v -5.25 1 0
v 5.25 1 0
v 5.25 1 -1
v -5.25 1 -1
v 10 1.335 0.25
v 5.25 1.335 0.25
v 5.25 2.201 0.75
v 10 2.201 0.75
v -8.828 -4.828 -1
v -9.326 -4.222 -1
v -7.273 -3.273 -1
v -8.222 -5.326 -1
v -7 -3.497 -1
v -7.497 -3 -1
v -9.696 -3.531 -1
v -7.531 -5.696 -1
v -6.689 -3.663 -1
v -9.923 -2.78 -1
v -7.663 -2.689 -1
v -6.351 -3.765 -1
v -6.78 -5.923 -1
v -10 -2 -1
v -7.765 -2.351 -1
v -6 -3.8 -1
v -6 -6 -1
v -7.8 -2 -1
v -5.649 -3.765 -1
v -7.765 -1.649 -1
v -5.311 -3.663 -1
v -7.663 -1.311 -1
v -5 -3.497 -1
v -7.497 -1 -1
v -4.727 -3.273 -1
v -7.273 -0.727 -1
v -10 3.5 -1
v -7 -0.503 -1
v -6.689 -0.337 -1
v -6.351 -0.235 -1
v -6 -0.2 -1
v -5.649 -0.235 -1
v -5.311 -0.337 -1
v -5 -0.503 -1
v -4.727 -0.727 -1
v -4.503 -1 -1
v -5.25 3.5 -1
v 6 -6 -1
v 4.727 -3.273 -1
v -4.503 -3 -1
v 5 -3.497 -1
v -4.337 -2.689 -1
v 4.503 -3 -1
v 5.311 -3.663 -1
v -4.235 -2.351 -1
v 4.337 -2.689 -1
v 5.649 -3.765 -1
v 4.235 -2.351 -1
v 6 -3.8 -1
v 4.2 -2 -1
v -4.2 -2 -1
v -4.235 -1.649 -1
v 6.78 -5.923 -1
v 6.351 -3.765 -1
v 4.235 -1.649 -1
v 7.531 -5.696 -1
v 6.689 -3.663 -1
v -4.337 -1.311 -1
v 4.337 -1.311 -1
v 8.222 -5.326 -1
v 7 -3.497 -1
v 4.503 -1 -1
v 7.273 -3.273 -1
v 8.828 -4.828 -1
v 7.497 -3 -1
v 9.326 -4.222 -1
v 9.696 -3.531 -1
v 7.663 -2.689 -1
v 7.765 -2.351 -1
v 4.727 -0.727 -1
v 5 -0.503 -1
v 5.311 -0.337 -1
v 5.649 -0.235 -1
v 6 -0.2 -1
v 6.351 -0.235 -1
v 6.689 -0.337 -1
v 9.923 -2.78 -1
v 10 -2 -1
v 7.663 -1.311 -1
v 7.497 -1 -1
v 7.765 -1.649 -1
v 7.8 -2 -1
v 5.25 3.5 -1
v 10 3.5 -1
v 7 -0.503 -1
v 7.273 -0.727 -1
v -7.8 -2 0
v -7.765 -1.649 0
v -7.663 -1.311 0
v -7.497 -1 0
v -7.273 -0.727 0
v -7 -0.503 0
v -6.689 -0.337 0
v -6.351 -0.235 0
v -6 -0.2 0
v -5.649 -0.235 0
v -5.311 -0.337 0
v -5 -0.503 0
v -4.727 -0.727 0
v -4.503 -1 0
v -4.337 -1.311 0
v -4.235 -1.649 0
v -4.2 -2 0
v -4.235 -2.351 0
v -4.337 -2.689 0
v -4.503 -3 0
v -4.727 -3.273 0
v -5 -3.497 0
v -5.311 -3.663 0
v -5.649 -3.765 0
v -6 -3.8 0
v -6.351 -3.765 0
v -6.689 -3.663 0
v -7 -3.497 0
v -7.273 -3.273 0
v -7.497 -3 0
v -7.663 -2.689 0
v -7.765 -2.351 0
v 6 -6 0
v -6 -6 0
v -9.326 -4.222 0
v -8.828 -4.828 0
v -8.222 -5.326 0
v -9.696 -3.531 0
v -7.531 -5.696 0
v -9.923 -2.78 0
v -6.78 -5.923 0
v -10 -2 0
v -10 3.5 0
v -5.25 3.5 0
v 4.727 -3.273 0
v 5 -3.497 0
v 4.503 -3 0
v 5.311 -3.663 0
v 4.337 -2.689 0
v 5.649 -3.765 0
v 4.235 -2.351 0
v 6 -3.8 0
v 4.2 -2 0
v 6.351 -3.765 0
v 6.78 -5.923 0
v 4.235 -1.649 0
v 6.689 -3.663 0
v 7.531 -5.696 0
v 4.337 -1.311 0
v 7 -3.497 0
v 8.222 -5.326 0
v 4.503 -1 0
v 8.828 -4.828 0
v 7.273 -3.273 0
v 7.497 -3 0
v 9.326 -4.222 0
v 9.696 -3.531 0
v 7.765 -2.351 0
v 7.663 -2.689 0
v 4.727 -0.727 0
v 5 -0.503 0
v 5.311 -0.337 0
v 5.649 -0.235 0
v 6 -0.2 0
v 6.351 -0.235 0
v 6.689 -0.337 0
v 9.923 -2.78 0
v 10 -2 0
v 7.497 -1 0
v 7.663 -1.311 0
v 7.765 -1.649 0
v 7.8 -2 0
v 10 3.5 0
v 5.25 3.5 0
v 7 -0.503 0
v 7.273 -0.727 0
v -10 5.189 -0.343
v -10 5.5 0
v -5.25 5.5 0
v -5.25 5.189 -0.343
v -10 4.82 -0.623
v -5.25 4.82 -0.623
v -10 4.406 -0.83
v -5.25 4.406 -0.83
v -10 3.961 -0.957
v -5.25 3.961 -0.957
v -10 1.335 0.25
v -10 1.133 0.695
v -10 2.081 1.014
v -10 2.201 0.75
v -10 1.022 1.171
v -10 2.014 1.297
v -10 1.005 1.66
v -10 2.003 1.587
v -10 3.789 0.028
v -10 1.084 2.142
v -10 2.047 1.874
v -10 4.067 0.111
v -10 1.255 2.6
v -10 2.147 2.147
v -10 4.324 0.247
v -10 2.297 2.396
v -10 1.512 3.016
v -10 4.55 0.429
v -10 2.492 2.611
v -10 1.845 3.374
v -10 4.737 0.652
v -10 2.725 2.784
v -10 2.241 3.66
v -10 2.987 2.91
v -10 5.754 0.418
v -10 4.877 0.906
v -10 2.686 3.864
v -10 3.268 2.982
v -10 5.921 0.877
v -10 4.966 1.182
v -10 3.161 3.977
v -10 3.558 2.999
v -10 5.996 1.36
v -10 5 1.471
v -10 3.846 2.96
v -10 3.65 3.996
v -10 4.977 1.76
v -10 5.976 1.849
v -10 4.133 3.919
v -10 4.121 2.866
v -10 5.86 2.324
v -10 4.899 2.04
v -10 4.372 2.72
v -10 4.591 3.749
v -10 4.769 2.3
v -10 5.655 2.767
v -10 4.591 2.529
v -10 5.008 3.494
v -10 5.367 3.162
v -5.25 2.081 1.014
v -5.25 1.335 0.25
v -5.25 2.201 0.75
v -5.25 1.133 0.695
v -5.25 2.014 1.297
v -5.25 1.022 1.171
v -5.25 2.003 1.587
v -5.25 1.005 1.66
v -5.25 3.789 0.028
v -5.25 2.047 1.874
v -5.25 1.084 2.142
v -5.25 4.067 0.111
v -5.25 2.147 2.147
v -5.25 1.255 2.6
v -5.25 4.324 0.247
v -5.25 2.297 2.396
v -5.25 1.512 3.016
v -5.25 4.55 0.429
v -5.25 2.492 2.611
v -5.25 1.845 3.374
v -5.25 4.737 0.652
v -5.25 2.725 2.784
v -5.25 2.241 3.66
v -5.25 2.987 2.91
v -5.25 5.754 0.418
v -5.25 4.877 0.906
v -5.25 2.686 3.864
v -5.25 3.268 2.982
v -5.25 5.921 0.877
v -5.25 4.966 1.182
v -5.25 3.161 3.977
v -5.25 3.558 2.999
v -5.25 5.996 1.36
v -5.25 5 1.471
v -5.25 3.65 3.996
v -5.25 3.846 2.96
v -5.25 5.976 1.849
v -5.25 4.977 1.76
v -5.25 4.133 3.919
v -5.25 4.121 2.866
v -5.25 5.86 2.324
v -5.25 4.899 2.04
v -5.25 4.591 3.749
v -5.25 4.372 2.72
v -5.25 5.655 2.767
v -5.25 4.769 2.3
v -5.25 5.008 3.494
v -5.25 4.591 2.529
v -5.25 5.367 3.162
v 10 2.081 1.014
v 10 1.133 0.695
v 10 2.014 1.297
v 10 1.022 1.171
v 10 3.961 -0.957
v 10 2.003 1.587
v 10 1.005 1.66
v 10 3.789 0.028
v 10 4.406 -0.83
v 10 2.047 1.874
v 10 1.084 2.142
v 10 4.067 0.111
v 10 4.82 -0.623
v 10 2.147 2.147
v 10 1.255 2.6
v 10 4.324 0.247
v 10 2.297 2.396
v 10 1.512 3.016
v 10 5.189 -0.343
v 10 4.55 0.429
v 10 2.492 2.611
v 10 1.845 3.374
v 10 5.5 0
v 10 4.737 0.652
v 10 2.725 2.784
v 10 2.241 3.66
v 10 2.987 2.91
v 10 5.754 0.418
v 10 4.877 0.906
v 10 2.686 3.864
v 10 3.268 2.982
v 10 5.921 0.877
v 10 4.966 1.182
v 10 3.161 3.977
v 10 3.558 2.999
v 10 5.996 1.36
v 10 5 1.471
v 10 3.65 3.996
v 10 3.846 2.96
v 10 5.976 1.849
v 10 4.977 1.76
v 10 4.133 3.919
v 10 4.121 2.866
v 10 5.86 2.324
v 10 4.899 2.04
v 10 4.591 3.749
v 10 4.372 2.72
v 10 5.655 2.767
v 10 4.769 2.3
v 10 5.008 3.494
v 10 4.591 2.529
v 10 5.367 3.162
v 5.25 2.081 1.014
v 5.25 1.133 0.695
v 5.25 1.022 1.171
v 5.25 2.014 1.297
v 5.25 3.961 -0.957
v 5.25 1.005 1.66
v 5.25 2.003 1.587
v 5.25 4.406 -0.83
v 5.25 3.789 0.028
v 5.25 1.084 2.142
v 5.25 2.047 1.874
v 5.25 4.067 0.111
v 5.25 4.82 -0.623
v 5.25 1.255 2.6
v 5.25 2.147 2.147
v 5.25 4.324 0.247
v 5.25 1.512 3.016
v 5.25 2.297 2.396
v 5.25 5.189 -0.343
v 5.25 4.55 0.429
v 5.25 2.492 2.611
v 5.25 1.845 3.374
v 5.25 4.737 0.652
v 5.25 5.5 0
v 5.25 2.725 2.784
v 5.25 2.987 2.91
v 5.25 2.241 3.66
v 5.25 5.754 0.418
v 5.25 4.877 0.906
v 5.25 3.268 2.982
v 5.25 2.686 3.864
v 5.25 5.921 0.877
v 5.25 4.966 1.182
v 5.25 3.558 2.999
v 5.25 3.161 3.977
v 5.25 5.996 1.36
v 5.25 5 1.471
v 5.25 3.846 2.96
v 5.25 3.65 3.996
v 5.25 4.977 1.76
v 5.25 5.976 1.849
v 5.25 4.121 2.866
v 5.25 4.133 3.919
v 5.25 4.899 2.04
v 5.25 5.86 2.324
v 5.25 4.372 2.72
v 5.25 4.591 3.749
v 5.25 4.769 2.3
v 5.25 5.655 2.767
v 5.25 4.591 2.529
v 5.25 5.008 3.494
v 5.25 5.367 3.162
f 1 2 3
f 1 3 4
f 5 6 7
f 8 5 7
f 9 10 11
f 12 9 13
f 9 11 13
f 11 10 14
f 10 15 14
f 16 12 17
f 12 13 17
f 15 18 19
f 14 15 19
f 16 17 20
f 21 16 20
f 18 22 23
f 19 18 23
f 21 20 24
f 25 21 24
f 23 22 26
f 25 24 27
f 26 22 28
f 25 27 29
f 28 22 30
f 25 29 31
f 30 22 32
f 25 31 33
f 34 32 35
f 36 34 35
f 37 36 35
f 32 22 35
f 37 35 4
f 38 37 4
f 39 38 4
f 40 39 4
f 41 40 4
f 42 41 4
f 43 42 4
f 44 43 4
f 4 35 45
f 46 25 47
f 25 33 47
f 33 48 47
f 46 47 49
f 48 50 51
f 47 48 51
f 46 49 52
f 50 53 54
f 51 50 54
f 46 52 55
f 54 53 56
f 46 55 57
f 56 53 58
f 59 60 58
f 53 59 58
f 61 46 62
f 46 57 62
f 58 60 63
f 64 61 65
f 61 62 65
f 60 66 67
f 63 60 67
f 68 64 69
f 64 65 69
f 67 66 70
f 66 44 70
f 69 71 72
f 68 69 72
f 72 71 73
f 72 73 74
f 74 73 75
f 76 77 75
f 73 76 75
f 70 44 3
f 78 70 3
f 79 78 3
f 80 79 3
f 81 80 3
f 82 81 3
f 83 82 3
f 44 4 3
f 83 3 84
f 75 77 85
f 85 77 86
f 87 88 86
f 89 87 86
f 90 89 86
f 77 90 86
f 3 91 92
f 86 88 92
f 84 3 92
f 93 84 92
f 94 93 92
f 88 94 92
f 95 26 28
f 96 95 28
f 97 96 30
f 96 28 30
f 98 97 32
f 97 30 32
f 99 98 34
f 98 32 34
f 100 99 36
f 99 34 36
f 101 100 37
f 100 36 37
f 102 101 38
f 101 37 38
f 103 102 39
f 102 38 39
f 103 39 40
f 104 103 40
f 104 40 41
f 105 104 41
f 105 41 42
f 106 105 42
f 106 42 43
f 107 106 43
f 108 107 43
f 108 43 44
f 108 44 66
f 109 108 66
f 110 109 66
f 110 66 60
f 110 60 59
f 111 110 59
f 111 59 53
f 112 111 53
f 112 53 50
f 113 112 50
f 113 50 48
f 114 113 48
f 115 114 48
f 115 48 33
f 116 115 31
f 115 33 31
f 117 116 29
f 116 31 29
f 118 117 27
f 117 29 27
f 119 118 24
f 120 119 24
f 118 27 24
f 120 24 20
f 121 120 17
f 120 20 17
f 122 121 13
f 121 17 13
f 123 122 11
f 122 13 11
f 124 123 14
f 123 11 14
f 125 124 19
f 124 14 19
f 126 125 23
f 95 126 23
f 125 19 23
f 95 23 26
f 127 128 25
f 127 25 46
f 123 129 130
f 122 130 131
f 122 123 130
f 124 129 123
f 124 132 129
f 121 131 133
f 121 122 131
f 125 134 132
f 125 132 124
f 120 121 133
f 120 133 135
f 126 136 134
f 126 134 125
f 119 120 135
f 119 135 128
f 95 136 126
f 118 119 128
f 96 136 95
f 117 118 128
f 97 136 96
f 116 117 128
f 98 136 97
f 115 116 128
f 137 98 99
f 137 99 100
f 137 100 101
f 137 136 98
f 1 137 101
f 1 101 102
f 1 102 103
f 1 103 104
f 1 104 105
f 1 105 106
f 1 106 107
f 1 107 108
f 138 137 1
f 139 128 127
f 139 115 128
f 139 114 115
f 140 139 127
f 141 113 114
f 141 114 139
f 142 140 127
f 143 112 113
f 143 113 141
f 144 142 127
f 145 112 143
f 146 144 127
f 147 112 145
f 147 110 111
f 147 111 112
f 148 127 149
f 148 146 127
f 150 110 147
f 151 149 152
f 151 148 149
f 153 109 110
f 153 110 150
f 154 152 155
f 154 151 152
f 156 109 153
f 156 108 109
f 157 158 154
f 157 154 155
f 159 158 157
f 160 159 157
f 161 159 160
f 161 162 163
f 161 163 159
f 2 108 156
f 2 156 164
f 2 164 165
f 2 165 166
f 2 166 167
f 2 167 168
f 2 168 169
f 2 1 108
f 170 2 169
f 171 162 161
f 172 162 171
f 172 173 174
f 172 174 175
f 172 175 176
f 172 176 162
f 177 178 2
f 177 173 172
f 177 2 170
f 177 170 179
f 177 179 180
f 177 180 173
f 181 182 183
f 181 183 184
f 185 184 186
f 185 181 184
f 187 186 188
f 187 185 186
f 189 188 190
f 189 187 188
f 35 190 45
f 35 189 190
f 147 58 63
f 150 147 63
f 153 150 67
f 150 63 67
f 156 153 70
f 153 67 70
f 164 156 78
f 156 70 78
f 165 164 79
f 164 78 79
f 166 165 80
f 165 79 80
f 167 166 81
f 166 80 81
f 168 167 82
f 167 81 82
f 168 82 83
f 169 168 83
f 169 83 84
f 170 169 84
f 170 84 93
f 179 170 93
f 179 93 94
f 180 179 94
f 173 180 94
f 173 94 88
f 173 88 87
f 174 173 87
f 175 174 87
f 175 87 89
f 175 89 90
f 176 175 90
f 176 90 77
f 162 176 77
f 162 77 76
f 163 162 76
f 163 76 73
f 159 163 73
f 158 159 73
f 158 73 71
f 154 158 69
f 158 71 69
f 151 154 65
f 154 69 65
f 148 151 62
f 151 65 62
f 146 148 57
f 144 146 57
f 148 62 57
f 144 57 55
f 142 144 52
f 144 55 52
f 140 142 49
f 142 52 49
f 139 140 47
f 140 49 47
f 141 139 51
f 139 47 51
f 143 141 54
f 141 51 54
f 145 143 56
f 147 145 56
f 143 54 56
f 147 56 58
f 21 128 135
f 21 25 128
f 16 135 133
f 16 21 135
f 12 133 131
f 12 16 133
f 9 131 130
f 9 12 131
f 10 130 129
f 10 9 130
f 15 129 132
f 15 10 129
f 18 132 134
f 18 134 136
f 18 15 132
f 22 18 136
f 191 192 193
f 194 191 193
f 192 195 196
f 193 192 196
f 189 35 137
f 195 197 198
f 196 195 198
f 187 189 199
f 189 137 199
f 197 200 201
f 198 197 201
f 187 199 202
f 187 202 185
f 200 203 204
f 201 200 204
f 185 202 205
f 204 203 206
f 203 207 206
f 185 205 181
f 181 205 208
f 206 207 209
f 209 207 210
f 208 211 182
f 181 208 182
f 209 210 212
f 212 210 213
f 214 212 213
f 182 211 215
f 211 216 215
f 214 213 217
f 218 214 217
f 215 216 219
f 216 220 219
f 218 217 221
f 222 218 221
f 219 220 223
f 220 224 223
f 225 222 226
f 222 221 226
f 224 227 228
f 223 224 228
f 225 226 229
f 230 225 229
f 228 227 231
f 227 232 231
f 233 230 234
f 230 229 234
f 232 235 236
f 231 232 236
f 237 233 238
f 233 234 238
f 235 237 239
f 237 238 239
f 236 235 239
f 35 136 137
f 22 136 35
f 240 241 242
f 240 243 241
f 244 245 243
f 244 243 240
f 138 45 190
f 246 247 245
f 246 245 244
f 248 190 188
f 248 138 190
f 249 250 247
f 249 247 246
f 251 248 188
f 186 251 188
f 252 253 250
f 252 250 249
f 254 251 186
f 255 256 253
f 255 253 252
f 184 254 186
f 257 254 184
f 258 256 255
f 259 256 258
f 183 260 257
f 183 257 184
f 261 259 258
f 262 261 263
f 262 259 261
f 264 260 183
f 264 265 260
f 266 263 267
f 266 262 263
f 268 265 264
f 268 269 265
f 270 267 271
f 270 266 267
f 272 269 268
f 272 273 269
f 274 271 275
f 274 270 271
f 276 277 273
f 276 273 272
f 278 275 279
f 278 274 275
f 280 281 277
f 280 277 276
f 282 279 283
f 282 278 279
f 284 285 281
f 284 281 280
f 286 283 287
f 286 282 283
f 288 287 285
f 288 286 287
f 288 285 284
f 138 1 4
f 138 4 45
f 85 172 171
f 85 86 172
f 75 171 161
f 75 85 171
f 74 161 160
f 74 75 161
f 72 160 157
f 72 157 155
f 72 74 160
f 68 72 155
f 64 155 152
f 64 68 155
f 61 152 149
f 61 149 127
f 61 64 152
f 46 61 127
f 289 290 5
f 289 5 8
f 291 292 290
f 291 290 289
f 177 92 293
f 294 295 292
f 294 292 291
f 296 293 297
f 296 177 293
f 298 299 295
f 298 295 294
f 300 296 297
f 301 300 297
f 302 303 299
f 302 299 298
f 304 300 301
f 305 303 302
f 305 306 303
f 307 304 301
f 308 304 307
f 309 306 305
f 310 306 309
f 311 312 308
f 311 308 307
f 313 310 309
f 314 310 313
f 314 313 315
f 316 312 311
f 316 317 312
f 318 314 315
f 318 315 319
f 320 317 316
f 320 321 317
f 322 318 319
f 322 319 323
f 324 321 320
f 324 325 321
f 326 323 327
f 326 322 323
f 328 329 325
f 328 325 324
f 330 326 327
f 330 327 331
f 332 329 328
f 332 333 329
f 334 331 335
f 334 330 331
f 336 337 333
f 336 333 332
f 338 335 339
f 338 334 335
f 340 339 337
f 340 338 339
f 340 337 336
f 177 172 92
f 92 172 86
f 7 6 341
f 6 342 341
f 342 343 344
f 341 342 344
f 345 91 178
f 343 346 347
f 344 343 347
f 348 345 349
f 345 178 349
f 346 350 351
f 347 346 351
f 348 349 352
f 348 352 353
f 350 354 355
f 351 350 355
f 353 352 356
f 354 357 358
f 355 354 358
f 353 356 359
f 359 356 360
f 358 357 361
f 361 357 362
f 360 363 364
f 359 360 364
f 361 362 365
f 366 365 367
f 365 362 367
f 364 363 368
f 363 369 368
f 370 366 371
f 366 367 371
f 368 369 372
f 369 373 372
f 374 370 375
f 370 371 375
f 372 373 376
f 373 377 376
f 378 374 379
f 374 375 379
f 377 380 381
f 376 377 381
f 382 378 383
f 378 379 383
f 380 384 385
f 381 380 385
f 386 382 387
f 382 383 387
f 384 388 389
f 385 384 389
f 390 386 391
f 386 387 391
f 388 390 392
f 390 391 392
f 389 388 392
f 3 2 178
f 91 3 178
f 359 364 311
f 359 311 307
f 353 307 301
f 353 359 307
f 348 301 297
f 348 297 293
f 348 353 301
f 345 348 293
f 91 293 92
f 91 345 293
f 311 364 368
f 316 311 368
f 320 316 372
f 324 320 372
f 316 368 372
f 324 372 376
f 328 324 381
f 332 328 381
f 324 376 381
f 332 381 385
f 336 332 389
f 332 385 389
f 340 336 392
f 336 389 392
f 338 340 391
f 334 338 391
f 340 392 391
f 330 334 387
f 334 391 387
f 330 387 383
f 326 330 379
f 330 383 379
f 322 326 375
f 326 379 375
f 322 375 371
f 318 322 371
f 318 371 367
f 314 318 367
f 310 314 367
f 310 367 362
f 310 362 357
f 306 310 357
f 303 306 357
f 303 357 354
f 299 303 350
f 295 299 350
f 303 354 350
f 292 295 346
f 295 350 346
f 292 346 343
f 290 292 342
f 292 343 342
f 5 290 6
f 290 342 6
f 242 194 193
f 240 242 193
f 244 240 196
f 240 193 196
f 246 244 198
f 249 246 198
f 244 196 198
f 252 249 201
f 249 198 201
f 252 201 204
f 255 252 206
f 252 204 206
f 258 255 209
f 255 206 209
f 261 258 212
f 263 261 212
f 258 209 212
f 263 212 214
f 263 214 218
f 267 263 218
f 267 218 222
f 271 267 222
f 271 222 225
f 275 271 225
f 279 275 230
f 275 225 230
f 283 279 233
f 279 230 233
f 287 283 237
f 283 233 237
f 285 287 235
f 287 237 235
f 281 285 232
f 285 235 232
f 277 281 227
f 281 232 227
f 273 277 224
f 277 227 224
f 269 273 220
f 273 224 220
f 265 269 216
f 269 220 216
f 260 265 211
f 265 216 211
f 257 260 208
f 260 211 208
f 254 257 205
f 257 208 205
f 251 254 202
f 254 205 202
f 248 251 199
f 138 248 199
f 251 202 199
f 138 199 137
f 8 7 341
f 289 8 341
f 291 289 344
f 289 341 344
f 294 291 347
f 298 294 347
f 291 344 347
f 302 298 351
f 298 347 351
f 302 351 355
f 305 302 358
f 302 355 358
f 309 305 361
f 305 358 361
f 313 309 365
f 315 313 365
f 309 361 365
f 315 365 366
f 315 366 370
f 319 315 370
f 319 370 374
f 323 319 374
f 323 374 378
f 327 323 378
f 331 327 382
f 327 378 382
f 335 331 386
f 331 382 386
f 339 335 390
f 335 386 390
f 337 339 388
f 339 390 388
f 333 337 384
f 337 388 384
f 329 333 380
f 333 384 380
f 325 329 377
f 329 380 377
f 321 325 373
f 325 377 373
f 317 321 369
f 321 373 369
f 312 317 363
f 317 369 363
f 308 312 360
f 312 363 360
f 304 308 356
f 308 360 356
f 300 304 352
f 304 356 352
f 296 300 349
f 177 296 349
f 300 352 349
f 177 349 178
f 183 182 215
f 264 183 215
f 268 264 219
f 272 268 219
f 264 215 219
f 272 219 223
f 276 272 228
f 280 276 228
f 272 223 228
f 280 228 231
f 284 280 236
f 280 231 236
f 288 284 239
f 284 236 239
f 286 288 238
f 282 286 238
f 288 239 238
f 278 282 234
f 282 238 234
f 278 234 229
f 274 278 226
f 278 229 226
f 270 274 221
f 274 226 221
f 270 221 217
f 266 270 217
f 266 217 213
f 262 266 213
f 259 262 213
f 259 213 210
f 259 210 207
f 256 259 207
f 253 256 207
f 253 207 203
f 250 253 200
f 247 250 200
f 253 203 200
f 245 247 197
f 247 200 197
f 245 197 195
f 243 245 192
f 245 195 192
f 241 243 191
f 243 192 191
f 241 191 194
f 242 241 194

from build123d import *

# Parameters (mm, degrees)
SM_BASE_FLANGE_1_DEPTH = 1
OTHER_START            = -10
OTHER_1_DEPTH          = 20
OTHER_1_2_DEPTH        = 4.75
OTHER_START_2          = 5.25
OTHER_1_3_DEPTH        = 4.75
FILLET_1_R             = 4
HOLE_WIZARD_M31_D      = 3.6


# Read off the part's stored shape, not the designer's step: Каемка1
# Sheet-metal steps are written as plain solids
with BuildPart() as part:
    # Sketch 1 → Базовая кромка1 (new body)
    with BuildSketch(Plane.XY):
        Polygon((5.25, 6), (5.25, 1), (-5.25, 1), (-5.25, 6), (-10, 6), (-10, -6), (10, -6), (10, 6), align=None)
    extrude(amount=-SM_BASE_FLANGE_1_DEPTH)

    # Other 1 outline → Other 1 (cut)
    with BuildSketch(Plane.YZ.offset(OTHER_START)):
        with BuildLine():
            Line((6, 0), (5.5, 0))
            ThreePointArc((5.5, 0), (4.618033989, -0.736067978), (3.5, -1))
            Line((3.5, -1), (6, -1))
            Line((6, -1), (6, 0))
        make_face()
    extrude(amount=OTHER_1_DEPTH, mode=Mode.SUBTRACT)

    # Other 1 2 outline → Other 1 2 (add)
    with BuildSketch(Plane.YZ.offset(OTHER_START)):
        with BuildLine():
            Line((1.334936491, 0.25), (2.200961894, 0.75))
            ThreePointArc((2.200961894, 0.75), (4.25, 2.799038106), (3.5, 0))
            Line((3.5, 0), (5.5, 0))
            ThreePointArc((5.5, 0), (3.649788152, 3.995508667), (1.334936491, 0.25))
        make_face()
    extrude(amount=OTHER_1_2_DEPTH)

    # Other 1 3 outline → Other 1 3 (add)
    with BuildSketch(Plane.YZ.offset(OTHER_START_2)):
        with BuildLine():
            Line((1.334936491, 0.25), (2.200961894, 0.75))
            ThreePointArc((2.200961894, 0.75), (4.25, 2.799038106), (3.5, 0))
            Line((3.5, 0), (5.5, 0))
            ThreePointArc((5.5, 0), (3.649788152, 3.995508667), (1.334936491, 0.25))
        make_face()
    extrude(amount=OTHER_1_3_DEPTH)

    # Скругление1
    fillet_1_edges = [part.edges().sort_by_distance(p)[0] for p in [
        (10, -6, -0.5),
        (-10, -6, -0.5),
    ]]
    fillet(fillet_1_edges, radius=FILLET_1_R)

    # Отверстие с зазором M31 (through all)
    with Locations(Plane.XY):
        with Locations((6, -2), (-6, -2)):
            Hole(HOLE_WIZARD_M31_D / 2)


solid = part.part
